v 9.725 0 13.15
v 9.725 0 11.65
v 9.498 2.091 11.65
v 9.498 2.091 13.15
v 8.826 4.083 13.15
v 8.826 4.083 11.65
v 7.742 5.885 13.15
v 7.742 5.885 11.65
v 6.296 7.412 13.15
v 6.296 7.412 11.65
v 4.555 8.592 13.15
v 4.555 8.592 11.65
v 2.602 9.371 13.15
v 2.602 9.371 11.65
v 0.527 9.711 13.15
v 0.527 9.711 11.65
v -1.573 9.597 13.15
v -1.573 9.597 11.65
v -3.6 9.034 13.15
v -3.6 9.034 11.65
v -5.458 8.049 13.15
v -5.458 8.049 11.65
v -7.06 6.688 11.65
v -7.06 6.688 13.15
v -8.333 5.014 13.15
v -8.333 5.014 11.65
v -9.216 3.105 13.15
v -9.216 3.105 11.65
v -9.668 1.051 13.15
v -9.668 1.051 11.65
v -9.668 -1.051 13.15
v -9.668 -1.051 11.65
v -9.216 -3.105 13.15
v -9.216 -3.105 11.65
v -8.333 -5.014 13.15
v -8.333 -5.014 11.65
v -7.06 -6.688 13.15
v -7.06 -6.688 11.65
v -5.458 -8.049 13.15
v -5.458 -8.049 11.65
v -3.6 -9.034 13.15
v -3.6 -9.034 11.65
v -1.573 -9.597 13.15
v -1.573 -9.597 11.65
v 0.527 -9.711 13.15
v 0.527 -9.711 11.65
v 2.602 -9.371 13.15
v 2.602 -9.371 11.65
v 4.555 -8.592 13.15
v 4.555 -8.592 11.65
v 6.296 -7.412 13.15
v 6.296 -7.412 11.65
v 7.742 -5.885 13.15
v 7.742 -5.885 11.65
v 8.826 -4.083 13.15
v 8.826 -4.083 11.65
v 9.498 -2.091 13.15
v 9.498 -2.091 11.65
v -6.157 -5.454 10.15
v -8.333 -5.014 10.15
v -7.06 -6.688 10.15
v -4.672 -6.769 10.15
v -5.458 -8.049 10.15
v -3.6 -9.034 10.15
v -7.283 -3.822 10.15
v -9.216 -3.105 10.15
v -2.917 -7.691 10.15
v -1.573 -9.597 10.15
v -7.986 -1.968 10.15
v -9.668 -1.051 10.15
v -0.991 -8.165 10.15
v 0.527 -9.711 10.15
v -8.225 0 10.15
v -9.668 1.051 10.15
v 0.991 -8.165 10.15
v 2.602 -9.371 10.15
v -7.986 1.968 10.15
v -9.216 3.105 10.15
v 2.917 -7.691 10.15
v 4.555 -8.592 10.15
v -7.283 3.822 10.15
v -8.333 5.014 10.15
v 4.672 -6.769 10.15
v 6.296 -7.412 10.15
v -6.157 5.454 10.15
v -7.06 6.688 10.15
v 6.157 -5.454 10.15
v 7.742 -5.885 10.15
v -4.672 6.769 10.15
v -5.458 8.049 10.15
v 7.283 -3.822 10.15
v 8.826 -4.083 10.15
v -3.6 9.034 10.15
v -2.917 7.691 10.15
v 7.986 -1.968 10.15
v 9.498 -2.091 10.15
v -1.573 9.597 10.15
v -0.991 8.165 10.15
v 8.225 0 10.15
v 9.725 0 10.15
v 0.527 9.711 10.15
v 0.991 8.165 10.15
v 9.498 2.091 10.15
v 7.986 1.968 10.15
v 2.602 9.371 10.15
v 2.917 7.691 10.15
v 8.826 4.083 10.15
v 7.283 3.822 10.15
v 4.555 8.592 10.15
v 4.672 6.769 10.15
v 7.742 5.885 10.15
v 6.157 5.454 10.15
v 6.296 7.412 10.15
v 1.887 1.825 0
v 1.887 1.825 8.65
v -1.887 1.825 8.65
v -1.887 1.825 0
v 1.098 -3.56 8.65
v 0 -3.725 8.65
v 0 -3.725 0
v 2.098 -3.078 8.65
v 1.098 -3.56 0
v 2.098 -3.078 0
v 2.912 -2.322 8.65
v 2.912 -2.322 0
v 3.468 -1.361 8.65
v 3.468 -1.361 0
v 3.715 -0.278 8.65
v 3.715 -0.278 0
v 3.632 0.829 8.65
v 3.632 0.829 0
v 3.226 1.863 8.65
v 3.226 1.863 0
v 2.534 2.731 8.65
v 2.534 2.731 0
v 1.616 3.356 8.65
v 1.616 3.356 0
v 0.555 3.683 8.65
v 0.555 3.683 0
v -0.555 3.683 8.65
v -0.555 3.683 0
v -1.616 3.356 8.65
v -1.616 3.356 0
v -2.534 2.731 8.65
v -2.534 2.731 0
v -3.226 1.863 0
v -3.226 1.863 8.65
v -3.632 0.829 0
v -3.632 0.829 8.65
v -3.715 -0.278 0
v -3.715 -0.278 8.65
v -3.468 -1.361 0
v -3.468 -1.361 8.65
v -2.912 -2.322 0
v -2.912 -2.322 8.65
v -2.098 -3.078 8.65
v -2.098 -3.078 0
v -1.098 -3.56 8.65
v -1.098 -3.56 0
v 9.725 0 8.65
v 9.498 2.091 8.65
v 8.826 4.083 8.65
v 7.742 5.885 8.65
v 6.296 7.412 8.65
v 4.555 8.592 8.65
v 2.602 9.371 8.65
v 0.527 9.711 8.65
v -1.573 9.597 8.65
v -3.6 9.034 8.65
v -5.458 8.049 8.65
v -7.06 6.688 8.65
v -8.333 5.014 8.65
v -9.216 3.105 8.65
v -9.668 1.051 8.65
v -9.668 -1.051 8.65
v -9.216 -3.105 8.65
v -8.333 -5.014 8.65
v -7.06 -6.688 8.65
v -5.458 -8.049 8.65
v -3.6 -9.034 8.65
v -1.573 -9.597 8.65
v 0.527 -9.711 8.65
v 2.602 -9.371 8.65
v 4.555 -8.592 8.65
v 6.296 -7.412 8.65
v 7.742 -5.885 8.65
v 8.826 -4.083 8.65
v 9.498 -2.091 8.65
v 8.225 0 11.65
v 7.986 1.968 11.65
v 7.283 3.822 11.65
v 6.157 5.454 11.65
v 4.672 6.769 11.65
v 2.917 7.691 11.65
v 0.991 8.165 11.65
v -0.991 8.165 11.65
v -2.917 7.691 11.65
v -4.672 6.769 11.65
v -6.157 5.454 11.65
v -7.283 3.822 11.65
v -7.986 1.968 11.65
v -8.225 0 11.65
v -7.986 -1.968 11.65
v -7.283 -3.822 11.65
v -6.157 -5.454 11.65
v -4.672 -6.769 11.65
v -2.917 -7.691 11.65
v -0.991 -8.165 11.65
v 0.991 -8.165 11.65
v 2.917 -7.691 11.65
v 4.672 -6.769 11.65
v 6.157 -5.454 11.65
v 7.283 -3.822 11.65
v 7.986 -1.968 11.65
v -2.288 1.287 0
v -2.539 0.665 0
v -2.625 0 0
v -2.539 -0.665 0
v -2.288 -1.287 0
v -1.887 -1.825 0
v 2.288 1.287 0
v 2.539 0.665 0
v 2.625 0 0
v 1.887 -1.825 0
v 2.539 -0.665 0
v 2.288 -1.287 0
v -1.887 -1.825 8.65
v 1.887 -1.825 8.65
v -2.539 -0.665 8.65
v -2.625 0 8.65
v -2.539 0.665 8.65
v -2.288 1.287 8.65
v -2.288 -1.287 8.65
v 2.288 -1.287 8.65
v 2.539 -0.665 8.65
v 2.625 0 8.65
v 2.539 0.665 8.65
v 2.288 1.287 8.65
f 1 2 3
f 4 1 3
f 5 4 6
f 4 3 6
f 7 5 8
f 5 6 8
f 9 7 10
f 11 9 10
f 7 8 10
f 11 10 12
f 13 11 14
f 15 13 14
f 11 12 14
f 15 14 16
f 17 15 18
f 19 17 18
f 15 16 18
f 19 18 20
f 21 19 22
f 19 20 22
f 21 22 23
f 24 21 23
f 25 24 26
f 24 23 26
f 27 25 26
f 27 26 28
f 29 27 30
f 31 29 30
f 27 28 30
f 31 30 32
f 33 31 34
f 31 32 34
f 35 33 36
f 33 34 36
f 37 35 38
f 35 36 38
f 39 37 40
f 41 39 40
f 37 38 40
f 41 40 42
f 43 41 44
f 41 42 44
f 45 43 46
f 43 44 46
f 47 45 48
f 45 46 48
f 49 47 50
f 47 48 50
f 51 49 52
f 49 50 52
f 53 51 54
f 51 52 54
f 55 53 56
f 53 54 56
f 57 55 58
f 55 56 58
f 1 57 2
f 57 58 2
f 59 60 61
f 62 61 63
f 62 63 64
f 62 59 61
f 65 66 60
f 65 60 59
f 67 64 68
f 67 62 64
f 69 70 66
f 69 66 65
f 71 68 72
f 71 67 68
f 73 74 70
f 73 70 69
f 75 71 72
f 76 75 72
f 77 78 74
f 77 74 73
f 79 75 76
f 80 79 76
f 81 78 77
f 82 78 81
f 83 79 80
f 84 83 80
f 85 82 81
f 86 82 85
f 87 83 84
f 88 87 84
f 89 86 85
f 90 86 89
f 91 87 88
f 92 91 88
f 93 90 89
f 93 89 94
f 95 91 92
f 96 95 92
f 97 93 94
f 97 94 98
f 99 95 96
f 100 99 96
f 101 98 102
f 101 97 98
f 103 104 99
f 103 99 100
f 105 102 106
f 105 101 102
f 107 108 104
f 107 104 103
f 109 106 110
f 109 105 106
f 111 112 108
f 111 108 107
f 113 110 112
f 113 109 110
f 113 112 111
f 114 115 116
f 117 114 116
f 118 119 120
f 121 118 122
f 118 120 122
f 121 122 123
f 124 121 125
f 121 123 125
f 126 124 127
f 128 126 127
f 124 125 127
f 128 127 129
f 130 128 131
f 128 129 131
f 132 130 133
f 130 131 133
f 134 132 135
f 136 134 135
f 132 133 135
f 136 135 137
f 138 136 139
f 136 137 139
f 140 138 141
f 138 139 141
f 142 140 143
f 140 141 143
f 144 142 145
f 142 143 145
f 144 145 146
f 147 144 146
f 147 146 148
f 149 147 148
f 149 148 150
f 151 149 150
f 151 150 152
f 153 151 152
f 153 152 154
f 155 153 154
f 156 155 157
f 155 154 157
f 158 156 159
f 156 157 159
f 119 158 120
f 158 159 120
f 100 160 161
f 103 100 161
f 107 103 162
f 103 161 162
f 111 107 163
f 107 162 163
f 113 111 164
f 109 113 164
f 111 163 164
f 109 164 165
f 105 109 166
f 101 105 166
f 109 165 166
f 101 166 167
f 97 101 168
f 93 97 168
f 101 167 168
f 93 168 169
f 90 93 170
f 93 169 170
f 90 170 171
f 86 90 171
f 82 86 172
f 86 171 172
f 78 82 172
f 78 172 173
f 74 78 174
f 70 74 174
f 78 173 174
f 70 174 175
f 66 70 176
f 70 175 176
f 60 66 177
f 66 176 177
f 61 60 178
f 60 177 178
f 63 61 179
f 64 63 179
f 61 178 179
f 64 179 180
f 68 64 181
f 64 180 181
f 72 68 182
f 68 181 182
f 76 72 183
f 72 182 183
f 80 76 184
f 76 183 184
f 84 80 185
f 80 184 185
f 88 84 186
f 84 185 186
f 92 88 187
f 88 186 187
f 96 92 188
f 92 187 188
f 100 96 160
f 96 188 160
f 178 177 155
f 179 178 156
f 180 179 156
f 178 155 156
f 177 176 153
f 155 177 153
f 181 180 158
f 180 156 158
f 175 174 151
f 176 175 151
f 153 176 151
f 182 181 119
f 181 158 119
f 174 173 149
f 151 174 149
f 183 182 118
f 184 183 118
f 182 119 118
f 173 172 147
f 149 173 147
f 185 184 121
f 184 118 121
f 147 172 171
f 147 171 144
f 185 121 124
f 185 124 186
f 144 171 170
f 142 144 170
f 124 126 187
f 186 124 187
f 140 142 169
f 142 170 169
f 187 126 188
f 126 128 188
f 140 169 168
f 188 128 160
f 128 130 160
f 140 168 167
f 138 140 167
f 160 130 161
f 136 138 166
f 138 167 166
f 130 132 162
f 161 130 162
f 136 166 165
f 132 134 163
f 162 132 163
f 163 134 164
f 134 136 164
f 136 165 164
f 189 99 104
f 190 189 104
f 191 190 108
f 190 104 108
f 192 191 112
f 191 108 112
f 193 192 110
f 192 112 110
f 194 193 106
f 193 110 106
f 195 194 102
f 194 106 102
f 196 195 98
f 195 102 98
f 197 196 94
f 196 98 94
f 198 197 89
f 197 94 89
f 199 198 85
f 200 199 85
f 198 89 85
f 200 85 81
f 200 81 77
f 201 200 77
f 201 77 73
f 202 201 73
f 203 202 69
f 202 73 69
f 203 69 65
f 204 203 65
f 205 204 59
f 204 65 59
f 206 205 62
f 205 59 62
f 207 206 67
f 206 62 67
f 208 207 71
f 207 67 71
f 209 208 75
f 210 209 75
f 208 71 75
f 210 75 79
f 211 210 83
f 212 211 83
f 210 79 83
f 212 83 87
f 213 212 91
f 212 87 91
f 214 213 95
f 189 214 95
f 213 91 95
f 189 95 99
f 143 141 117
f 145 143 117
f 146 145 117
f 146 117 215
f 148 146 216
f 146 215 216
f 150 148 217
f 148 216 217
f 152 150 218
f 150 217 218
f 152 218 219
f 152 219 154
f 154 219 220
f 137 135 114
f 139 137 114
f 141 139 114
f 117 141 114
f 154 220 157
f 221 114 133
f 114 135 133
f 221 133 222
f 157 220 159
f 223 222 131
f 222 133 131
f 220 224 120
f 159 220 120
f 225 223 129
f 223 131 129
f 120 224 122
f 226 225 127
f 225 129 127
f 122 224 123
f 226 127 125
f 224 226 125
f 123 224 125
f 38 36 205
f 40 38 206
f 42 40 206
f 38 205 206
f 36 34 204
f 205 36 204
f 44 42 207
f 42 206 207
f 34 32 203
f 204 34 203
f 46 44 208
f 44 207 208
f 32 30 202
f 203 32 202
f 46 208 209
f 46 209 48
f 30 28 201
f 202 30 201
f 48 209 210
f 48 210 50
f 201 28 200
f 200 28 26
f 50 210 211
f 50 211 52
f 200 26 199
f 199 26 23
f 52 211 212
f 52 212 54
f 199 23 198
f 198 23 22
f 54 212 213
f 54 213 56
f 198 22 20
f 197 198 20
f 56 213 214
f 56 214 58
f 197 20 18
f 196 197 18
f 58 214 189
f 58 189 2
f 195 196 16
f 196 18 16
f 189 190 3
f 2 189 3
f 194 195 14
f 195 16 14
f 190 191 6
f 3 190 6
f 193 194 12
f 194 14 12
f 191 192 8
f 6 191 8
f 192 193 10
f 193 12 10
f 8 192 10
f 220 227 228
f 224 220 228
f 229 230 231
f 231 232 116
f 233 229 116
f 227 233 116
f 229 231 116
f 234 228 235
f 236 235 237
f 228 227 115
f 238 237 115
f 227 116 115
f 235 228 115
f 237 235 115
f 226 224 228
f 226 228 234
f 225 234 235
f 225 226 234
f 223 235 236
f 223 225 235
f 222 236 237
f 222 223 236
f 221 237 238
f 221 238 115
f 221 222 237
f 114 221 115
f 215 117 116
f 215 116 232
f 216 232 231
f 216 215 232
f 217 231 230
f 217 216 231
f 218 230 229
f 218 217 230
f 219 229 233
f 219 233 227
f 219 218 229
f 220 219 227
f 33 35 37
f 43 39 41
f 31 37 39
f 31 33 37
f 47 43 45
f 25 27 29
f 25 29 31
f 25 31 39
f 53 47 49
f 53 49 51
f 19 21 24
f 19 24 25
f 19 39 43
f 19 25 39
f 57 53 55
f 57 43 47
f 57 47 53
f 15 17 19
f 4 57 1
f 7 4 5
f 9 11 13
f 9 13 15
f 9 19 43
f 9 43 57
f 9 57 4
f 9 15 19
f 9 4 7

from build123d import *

# Parameters (mm, degrees)
SKETCH1_R           = 3.725
BOSS_EXTRUDE1_DEPTH = 8.65
SKETCH2_R           = 9.725
BOSS_EXTRUDE2_DEPTH = 1.5
SKETCH3_R           = 8.225
BOSS_EXTRUDE3_DEPTH = 1.5
SKETCH5_R           = 9.725
BOSS_EXTRUDE5_DEPTH = 1.5


with BuildPart() as part:
    # Sketch1 → Boss-Extrude1 (new body)
    with BuildSketch(Plane.XY):
        with Locations(Location((0, 0, 0), (0, 0, 270))):
            Circle(SKETCH1_R)
        with BuildLine():
            Line((-1.886796226, -1.825), (1.886796226, -1.825))
            ThreePointArc((1.886796226, -1.825), (2.625, 0), (1.886796226, 1.825))
            Line((1.886796226, 1.825), (-1.886796226, 1.825))
            ThreePointArc((-1.886796226, 1.825), (-2.625, 0), (-1.886796226, -1.825))
        make_face(mode=Mode.SUBTRACT)
    extrude(amount=BOSS_EXTRUDE1_DEPTH)

    # Sketch2 → Boss-Extrude2 (add)
    with BuildSketch(Plane.XY.offset(8.65)):
        Circle(SKETCH2_R)
    extrude(amount=BOSS_EXTRUDE2_DEPTH)

    # Sketch3 → Boss-Extrude3 (add)
    with BuildSketch(Plane.XY.offset(10.15)):
        Circle(SKETCH3_R)
    extrude(amount=BOSS_EXTRUDE3_DEPTH)

    # Sketch5 → Boss-Extrude5 (add)
    with BuildSketch(Plane.XY.offset(11.65)):
        Circle(SKETCH5_R)
    extrude(amount=BOSS_EXTRUDE5_DEPTH)


solid = part.part
